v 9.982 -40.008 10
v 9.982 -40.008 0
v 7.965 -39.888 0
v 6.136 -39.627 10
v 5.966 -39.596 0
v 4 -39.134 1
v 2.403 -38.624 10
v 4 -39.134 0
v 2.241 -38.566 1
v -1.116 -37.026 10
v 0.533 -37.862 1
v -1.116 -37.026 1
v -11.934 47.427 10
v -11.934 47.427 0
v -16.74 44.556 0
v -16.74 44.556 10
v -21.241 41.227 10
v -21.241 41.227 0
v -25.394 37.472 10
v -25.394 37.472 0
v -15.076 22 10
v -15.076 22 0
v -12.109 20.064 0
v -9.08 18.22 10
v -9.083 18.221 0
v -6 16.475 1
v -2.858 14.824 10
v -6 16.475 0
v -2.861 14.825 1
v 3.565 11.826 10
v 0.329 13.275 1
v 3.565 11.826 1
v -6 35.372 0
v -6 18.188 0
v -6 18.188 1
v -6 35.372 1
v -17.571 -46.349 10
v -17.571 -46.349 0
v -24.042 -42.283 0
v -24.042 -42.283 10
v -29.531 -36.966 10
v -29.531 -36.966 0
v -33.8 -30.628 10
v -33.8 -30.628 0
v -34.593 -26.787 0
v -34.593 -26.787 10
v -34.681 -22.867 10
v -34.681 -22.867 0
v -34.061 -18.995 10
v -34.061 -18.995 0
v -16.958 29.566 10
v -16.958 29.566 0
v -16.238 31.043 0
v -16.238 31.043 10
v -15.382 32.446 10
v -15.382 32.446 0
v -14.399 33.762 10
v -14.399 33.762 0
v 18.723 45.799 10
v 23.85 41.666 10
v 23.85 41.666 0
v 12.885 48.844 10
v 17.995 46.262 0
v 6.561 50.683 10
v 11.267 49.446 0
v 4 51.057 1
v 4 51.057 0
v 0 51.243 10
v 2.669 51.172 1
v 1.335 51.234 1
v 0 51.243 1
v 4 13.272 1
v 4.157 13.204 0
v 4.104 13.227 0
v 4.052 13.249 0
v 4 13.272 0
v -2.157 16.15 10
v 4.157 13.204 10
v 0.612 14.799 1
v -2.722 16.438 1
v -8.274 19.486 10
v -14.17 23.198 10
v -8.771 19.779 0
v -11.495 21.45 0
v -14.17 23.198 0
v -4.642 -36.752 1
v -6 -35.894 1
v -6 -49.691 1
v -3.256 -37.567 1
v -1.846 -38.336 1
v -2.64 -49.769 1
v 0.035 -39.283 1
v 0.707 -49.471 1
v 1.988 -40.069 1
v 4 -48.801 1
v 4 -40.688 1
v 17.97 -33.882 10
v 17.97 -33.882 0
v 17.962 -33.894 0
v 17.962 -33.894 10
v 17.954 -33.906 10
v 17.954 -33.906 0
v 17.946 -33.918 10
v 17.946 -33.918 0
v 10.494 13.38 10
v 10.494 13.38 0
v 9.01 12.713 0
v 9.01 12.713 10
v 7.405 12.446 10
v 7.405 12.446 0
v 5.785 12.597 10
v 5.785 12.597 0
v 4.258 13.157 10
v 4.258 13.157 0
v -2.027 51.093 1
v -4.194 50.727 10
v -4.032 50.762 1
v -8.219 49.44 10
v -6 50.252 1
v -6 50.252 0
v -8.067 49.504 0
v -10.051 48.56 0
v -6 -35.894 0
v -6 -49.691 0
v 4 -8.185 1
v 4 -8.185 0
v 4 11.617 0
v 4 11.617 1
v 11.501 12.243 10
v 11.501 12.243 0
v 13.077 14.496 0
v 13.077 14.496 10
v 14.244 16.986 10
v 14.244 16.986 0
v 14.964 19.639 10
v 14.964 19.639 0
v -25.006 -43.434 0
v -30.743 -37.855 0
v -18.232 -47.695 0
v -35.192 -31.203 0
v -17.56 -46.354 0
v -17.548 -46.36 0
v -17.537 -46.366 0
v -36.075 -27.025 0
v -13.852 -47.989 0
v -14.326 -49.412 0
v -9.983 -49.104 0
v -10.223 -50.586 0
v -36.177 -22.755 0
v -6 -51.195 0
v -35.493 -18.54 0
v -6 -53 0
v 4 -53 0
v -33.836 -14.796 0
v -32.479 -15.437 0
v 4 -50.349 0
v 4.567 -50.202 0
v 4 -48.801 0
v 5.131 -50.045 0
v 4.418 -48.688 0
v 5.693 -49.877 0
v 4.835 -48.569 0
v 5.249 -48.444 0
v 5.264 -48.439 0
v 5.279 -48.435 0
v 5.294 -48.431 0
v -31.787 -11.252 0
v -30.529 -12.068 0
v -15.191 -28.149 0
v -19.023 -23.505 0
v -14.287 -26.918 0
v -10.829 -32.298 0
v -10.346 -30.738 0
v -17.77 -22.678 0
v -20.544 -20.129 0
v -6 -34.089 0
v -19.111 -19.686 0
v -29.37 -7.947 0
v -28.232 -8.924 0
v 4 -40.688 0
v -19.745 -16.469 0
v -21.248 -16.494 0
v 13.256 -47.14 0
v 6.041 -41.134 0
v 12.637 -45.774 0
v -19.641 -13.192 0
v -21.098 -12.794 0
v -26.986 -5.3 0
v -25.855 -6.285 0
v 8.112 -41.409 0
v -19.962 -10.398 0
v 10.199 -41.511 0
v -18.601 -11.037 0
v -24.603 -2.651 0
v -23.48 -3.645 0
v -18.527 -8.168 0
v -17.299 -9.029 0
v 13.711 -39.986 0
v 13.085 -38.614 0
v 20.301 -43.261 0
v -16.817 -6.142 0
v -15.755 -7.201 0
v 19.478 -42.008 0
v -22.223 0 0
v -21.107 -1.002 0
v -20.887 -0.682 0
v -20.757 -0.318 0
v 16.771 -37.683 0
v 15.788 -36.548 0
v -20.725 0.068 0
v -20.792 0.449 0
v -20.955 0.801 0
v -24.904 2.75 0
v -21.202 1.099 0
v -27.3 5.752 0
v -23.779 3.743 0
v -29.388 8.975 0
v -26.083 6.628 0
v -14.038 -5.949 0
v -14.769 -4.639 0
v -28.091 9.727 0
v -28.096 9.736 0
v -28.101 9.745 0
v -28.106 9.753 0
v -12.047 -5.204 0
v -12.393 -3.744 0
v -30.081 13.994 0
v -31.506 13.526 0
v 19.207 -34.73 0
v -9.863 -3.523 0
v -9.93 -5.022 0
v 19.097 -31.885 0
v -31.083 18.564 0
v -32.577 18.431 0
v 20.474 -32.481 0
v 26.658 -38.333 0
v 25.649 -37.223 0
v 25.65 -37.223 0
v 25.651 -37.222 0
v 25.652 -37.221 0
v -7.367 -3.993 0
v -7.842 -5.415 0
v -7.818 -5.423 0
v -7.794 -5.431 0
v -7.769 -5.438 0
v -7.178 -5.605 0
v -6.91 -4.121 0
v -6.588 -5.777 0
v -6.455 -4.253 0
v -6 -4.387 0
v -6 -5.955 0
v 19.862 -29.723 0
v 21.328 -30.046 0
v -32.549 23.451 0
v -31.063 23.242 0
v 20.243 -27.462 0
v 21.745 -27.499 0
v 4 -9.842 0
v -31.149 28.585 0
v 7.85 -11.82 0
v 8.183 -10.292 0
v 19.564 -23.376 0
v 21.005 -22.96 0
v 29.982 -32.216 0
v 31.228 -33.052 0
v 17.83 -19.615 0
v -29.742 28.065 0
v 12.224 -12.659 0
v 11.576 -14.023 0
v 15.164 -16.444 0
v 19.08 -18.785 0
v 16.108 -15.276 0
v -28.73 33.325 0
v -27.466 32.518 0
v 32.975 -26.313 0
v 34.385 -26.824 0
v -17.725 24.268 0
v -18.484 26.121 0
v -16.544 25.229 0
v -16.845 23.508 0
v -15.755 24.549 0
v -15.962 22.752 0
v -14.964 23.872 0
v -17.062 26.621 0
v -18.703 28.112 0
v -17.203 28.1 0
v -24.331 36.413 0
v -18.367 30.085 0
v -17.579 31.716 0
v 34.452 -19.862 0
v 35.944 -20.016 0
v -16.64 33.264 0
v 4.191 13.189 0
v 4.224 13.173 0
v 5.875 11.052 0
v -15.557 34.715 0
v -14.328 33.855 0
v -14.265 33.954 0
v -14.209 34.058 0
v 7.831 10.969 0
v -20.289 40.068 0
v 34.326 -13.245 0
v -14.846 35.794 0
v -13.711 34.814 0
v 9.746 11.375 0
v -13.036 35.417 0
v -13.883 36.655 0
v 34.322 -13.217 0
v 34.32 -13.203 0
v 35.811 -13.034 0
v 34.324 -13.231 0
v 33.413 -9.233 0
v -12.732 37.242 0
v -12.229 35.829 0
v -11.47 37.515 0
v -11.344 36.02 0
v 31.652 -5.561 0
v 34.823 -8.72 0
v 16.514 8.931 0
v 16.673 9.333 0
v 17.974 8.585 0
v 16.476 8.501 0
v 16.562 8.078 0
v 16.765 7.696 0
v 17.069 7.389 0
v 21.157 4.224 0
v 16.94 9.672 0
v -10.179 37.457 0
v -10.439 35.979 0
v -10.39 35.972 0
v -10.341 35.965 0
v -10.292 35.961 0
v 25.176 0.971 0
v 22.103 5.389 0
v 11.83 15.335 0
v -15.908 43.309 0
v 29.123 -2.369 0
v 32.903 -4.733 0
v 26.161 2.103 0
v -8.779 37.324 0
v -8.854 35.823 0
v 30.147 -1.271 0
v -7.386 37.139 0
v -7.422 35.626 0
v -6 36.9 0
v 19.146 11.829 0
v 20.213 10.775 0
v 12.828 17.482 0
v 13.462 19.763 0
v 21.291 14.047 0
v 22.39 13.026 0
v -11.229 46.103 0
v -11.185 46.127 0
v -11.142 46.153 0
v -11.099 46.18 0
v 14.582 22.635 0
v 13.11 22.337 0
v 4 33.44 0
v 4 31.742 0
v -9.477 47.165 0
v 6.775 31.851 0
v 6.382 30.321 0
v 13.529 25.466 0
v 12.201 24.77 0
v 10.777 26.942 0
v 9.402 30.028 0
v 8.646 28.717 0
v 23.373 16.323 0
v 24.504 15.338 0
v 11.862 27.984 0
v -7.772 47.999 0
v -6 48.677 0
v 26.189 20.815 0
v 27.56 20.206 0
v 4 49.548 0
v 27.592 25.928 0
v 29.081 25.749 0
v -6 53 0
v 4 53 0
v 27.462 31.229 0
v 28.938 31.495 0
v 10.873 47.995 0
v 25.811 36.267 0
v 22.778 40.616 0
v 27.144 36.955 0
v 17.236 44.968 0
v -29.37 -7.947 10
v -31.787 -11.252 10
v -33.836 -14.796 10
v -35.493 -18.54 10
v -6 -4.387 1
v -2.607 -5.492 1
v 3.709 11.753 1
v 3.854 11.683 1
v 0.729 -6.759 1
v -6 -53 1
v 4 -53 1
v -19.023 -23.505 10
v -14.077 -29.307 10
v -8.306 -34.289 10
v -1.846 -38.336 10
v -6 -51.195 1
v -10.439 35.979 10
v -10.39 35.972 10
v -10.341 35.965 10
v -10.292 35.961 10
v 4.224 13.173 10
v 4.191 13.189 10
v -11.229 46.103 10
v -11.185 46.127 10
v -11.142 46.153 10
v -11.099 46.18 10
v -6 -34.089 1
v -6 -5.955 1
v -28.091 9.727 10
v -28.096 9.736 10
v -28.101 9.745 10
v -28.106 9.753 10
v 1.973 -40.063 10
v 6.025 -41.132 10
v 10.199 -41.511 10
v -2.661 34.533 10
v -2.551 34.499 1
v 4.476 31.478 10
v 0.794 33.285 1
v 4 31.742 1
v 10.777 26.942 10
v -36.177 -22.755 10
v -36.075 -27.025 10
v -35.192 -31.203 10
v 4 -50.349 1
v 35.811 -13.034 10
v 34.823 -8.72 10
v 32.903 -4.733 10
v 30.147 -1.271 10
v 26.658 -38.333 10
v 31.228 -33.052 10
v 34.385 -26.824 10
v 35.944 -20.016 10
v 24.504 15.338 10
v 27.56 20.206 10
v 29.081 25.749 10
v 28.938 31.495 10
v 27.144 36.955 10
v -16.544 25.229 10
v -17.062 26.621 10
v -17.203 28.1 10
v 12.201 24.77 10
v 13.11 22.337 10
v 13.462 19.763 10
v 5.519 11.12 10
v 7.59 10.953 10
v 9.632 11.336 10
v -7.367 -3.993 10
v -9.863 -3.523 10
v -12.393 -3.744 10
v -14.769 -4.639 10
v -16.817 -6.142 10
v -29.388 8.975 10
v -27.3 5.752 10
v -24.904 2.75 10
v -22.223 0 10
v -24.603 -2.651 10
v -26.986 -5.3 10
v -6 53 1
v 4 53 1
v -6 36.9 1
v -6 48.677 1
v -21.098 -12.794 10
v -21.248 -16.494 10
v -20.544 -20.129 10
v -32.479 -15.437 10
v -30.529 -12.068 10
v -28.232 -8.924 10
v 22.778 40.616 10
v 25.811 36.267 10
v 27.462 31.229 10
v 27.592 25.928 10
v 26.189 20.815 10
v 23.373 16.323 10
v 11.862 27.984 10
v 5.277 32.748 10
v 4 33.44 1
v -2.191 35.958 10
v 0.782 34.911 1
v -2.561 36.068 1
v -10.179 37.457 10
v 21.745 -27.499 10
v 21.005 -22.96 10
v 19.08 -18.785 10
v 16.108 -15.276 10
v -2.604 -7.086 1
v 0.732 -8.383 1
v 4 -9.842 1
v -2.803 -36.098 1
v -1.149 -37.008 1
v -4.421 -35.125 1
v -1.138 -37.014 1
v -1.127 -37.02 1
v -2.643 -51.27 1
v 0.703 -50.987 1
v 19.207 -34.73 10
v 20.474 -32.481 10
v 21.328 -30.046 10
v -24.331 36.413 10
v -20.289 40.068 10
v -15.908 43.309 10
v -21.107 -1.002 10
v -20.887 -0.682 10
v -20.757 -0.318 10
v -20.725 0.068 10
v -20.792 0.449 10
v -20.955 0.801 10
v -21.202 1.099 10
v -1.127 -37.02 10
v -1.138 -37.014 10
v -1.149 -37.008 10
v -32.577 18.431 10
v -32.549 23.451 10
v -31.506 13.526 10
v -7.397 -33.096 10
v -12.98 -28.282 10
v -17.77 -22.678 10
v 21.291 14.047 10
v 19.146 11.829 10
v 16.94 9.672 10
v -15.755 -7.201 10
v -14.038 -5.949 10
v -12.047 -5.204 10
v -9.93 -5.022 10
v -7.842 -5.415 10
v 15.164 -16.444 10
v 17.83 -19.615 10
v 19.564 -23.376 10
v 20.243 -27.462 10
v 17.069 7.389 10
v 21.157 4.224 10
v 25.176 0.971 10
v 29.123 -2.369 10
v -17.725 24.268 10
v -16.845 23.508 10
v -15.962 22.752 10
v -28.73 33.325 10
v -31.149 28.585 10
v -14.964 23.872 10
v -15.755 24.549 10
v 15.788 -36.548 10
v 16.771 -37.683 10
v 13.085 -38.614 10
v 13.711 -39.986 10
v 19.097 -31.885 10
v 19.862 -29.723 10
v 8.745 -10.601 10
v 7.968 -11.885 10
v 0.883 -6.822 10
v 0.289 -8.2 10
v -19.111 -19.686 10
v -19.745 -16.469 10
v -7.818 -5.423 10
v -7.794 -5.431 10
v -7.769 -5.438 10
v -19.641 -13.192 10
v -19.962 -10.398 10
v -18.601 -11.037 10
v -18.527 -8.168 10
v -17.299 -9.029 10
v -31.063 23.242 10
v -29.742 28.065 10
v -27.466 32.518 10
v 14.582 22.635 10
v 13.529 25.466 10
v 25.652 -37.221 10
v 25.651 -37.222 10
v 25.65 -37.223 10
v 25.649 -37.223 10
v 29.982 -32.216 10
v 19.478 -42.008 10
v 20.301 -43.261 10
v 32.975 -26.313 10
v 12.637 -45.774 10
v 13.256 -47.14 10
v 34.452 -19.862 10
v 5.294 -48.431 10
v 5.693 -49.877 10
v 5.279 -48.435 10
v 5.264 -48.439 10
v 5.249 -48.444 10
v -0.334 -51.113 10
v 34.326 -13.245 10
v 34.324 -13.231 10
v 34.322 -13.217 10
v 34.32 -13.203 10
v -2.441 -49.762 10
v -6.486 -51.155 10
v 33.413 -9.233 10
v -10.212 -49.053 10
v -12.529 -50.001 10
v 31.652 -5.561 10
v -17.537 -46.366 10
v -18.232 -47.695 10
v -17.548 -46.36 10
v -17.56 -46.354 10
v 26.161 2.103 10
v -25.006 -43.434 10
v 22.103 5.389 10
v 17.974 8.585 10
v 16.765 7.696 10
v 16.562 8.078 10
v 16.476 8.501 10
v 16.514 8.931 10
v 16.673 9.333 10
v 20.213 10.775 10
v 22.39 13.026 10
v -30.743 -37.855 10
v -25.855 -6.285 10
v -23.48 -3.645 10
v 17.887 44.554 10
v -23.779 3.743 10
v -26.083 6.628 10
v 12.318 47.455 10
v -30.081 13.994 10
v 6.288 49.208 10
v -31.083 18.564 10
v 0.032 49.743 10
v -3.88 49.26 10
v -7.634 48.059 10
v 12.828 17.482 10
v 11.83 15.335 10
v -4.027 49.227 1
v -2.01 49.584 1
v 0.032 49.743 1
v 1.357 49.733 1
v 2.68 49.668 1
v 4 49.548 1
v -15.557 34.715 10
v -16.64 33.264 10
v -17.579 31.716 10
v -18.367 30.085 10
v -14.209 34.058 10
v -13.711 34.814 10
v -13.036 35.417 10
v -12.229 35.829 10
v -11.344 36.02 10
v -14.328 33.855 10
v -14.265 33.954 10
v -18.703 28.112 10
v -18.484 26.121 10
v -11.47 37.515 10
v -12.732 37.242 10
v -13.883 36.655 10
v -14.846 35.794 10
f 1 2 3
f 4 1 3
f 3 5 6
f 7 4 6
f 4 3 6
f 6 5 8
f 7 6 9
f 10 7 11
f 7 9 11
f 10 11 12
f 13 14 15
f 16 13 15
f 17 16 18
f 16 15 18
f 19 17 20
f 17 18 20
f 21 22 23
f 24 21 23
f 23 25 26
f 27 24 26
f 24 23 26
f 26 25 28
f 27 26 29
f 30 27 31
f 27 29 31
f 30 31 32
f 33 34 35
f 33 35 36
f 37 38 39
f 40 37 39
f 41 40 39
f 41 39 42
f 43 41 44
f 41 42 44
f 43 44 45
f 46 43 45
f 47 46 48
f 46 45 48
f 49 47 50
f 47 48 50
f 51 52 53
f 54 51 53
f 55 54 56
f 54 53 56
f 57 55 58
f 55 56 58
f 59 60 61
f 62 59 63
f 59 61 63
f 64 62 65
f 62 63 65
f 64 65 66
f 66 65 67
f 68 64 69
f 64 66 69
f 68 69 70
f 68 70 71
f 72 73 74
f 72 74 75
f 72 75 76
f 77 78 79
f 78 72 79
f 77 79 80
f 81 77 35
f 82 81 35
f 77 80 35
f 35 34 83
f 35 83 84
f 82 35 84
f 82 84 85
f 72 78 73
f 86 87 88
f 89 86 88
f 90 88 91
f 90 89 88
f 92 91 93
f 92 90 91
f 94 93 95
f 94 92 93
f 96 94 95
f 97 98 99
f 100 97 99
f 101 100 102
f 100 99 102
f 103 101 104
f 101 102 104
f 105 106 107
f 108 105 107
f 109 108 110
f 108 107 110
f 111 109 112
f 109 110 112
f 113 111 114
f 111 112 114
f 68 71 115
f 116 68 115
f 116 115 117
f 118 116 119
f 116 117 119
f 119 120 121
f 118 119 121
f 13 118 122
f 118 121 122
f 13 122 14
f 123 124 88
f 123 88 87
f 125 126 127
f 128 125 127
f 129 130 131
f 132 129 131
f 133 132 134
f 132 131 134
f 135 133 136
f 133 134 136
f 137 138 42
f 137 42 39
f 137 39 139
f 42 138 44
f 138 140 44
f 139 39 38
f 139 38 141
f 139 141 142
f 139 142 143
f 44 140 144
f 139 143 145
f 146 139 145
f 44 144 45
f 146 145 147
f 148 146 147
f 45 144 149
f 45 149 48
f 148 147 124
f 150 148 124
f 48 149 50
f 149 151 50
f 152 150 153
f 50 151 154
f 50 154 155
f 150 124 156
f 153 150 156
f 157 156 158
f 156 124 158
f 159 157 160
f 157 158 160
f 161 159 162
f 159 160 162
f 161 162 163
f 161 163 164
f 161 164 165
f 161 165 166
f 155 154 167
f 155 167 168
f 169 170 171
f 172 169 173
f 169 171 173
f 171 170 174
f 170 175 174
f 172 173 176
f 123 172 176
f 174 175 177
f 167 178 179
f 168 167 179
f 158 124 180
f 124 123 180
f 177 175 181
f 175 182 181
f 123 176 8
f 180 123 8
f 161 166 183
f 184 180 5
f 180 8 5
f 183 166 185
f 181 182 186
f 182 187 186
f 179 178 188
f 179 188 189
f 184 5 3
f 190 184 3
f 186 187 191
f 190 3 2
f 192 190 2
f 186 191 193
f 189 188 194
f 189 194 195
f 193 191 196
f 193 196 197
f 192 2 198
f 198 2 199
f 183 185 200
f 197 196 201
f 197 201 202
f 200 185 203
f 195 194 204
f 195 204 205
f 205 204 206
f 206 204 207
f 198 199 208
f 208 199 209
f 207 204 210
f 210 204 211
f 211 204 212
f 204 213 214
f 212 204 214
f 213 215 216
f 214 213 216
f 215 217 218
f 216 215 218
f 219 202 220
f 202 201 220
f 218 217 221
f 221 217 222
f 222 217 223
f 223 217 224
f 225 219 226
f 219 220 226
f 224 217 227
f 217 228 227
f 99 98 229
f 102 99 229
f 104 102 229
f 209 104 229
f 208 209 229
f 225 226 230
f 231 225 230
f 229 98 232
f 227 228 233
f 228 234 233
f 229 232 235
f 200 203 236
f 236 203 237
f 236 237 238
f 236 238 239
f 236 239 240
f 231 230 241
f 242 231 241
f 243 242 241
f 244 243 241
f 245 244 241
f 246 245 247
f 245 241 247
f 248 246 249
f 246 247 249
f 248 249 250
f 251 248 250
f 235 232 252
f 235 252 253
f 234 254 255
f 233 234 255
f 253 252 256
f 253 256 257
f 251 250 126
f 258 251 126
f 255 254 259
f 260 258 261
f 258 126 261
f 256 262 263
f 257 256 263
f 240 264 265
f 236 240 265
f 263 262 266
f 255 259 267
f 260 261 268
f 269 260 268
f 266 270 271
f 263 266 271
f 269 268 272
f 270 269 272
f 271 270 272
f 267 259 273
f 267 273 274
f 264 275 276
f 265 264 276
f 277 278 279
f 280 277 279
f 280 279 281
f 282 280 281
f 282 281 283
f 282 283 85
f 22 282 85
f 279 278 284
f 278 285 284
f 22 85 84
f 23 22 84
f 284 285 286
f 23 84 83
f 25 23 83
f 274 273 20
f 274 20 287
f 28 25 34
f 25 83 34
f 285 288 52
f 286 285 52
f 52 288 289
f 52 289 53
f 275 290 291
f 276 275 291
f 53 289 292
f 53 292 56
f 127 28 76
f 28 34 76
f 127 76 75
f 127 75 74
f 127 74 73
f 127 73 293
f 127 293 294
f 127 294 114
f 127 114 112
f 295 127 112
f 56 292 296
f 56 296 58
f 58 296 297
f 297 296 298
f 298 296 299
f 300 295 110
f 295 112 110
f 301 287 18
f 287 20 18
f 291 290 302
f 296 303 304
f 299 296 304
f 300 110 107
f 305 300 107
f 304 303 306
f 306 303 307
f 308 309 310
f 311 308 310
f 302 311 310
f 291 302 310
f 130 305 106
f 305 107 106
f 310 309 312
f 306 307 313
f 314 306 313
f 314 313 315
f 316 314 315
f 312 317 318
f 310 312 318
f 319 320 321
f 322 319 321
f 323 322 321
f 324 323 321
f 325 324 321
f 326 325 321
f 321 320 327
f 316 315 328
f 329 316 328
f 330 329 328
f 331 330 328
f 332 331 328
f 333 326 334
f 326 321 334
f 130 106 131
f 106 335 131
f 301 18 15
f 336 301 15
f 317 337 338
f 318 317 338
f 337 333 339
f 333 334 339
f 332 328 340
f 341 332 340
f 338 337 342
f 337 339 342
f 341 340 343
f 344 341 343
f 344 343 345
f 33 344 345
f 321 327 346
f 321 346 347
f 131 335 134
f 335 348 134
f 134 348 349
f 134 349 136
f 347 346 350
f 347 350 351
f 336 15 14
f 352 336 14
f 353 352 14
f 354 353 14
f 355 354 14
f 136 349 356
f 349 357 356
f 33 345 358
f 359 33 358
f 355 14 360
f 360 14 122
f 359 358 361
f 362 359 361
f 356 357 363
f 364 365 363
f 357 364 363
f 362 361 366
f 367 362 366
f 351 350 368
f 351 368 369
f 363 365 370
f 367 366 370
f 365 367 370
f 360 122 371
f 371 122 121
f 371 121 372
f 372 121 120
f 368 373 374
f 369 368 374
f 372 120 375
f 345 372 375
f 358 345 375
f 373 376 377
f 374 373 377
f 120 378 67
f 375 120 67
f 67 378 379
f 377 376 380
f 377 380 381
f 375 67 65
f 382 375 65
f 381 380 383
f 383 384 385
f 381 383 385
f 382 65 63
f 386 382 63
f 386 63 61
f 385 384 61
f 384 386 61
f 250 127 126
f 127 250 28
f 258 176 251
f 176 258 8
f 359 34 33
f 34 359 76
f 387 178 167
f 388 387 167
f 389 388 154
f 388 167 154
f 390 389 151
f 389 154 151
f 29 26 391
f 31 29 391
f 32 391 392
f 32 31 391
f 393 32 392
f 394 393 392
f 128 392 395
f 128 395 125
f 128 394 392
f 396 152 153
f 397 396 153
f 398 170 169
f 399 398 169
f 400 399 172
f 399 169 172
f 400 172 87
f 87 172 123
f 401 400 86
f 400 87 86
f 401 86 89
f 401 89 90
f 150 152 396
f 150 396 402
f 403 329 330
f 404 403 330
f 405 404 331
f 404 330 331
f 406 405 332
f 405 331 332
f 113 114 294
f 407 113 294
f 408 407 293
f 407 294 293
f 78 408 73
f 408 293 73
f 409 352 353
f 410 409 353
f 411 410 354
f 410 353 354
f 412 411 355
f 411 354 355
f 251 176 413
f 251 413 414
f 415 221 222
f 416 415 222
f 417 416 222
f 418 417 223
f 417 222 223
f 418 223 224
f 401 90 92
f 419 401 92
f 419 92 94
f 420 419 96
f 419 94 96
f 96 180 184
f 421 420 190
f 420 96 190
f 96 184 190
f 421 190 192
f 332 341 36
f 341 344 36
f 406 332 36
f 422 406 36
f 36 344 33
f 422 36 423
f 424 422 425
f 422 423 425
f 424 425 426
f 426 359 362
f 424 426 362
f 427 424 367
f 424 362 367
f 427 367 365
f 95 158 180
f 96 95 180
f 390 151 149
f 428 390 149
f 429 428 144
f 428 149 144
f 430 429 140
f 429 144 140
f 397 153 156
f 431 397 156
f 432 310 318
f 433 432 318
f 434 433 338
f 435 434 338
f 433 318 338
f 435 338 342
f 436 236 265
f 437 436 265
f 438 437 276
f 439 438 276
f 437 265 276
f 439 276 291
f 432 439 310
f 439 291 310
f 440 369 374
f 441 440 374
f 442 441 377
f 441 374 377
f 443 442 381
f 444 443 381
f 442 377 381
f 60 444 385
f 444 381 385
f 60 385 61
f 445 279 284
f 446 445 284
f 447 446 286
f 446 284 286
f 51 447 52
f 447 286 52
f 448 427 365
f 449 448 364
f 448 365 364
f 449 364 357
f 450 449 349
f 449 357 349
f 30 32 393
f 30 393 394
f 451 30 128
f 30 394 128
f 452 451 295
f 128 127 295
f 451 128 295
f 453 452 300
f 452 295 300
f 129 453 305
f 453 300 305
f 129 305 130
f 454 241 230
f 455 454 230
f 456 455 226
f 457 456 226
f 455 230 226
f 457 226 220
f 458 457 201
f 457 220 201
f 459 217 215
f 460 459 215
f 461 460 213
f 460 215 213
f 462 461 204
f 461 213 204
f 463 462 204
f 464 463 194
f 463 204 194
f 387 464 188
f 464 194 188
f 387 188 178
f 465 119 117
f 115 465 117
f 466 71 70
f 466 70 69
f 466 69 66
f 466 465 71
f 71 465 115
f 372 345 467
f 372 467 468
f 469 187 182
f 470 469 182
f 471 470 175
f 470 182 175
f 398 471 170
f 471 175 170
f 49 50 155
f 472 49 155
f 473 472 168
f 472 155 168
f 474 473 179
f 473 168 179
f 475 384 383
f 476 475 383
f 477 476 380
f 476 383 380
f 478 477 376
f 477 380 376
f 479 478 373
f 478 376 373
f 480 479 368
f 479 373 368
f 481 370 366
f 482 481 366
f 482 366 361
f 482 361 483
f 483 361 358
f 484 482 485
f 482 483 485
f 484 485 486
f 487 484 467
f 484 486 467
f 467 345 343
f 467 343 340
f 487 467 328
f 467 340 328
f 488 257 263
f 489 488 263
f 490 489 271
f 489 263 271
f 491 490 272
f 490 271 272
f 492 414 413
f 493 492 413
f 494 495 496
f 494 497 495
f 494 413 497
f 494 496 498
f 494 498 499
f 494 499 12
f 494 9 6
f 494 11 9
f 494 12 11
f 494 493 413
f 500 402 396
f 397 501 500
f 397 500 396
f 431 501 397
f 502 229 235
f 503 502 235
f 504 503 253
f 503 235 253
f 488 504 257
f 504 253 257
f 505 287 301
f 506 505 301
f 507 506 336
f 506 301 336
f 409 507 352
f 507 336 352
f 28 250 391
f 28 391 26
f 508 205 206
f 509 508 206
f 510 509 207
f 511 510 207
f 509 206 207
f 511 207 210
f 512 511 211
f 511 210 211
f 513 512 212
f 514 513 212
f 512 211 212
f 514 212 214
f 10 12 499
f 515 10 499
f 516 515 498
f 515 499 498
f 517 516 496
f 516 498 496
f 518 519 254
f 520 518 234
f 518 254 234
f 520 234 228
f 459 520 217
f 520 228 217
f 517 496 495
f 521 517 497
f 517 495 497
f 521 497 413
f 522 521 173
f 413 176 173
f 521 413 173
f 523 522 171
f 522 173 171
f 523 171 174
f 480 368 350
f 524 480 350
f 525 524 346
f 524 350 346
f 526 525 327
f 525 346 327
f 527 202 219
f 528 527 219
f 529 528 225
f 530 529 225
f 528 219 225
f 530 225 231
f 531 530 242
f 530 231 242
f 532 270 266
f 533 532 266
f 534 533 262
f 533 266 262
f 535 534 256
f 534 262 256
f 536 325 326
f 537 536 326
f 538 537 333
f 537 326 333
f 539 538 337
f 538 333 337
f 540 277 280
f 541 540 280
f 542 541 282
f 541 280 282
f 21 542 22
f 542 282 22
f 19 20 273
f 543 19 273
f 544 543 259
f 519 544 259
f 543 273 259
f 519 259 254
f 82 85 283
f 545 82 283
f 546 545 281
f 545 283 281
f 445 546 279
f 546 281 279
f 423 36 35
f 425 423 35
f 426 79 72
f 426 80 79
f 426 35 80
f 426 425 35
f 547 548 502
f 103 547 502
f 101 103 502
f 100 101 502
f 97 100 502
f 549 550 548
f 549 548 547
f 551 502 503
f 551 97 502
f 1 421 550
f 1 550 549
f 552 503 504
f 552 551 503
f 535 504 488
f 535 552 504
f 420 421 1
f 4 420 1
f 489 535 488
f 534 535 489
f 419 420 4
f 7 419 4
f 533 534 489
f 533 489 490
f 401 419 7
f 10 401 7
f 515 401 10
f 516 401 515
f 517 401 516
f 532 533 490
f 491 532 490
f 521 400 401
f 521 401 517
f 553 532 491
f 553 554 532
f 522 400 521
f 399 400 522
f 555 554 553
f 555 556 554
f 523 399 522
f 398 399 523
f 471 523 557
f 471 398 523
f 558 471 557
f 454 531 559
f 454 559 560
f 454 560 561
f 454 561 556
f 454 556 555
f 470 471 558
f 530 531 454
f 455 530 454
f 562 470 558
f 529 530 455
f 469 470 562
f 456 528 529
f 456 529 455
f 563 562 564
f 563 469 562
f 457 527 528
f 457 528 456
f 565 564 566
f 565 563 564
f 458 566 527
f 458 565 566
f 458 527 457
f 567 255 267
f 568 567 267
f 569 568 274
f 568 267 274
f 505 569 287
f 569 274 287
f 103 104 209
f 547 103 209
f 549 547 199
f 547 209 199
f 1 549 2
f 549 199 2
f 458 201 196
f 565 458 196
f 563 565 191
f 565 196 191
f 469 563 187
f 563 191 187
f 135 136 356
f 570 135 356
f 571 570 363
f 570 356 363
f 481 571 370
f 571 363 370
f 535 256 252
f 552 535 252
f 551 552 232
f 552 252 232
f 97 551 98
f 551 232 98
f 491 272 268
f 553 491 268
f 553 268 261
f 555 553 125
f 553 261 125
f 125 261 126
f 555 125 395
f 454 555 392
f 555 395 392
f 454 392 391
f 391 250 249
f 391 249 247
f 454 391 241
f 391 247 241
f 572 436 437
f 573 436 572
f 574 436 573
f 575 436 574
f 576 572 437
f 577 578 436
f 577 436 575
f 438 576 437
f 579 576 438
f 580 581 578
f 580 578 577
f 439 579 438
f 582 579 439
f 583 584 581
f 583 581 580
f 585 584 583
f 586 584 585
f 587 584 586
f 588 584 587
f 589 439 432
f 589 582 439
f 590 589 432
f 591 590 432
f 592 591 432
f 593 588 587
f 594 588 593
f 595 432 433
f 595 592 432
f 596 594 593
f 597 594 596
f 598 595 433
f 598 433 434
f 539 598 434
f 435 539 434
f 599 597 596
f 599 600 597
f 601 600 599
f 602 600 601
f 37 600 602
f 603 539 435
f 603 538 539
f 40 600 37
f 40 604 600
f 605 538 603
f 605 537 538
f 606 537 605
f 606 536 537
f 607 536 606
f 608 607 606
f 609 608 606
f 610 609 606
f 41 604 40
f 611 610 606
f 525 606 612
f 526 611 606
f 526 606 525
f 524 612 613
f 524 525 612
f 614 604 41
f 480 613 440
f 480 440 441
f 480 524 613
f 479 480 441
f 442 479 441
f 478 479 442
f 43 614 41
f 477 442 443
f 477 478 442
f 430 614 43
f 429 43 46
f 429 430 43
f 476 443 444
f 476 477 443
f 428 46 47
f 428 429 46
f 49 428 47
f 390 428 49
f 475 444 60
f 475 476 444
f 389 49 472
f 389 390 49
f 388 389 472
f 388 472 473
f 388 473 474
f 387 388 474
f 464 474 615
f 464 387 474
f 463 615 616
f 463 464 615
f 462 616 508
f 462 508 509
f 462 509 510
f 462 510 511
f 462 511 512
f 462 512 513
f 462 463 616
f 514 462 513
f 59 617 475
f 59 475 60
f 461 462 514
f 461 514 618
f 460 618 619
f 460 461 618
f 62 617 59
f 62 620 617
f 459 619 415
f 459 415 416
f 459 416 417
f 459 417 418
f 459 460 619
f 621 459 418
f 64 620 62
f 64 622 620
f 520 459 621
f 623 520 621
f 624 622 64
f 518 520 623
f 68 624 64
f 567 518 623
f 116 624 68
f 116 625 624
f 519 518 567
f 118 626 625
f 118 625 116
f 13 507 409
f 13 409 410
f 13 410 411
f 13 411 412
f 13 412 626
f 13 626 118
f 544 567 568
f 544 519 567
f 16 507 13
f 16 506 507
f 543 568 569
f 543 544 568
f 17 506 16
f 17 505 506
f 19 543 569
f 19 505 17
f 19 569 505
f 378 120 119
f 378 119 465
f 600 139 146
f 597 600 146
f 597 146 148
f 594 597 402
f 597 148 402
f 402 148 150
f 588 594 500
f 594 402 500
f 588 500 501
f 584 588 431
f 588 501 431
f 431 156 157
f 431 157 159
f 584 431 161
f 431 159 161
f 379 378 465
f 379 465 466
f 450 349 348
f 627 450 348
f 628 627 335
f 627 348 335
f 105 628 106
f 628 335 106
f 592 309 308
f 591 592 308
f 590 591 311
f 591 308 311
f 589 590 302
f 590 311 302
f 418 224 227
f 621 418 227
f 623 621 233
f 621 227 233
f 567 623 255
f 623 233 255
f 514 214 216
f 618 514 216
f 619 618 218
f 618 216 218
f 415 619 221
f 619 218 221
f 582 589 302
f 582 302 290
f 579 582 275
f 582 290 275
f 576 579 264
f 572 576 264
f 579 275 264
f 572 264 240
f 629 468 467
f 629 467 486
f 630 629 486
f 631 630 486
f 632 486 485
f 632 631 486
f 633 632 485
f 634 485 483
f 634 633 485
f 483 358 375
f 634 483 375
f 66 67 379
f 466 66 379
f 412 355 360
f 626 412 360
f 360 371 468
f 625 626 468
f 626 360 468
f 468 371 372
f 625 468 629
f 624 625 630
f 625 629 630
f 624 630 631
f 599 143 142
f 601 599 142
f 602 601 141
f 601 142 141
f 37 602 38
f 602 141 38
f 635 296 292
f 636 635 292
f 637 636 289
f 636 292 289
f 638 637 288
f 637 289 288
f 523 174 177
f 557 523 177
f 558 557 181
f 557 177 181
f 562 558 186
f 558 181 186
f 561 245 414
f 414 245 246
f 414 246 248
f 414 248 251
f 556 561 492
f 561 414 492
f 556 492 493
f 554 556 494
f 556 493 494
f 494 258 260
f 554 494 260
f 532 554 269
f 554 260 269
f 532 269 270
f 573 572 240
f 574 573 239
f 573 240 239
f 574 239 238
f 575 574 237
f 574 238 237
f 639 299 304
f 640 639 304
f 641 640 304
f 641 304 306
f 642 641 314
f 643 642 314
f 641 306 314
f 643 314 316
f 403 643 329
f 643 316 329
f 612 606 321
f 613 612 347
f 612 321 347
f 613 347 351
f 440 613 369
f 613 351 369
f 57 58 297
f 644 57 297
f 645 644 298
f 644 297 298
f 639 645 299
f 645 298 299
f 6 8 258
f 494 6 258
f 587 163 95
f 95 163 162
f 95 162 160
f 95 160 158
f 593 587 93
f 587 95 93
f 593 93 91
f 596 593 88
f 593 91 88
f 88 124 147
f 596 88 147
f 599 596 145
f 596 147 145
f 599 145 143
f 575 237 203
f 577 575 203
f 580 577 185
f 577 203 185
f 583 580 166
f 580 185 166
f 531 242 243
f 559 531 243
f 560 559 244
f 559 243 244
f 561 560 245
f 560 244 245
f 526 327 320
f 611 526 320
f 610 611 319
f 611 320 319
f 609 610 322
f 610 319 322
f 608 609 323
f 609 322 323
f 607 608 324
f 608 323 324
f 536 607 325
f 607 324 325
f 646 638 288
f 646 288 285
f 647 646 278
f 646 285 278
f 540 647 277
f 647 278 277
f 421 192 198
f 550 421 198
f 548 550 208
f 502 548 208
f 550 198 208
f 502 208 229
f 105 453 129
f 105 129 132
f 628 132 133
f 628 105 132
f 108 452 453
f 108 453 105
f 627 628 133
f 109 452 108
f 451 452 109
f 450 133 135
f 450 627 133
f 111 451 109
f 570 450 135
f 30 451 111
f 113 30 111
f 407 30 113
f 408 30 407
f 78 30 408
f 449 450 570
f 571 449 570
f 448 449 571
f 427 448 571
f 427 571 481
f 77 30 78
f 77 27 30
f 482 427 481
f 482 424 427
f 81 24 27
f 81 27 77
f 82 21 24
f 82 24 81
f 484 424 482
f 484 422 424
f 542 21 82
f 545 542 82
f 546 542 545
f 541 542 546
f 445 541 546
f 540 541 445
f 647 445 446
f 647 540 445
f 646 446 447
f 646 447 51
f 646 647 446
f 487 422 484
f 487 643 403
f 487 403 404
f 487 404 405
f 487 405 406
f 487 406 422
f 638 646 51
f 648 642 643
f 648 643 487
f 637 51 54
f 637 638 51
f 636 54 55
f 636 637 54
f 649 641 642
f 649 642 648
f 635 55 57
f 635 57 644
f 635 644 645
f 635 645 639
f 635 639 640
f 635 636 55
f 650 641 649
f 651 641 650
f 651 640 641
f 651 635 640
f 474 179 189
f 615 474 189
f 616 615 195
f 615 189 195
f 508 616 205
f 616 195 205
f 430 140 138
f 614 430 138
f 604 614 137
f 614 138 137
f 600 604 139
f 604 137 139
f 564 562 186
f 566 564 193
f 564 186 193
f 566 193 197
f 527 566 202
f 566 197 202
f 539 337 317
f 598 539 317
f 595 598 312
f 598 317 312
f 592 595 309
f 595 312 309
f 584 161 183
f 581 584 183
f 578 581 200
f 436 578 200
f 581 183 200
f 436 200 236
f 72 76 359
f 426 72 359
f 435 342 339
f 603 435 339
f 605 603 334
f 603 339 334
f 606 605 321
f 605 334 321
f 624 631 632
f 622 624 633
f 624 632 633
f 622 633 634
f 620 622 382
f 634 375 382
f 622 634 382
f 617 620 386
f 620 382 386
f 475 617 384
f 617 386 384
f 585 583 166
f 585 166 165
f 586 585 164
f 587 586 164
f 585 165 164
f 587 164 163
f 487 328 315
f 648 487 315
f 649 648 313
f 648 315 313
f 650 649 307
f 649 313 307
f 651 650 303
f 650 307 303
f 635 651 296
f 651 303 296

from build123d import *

# Parameters (mm, degrees)
BOX_W         = 10
BOX_H         = 106
BOX_DEPTH     = 1
EXTRUDE_DEPTH = 10


with BuildPart() as cube:
    # Box → Box (new body)
    with BuildSketch(Plane(origin=(-6, -53, 0), x_dir=(1, 0, 0), z_dir=(0, 0, 1))):
        with Locations((5, 53)):
            Rectangle(BOX_W, BOX_H)
    extrude(amount=BOX_DEPTH)


with BuildPart() as fusion:
    # Offset2D → Extrude (new body)
    with BuildSketch(Plane(origin=(-0.426228, -0.837563, 0), x_dir=(0, 1, 0), z_dir=(0, 0, 1))):
        with BuildLine():
            ThreePointArc((42.503525, -24.276272), (49.68176, -13.31089), (52.080118, -0.426228))
            ThreePointArc((52.080118, -0.426228), (51.015355, 5.810333), (48.264258, 11.507689))
            ThreePointArc((48.264258, 11.507689), (43.784533, 18.605601), (38.309512, 24.967395))
            ThreePointArc((38.309512, 24.967395), (31.855149, 29.634938), (24.288431, 32.122818))
            ThreePointArc((24.288431, 32.122818), (16.786489, 31.750925), (9.812264, 28.962088))
            ThreePointArc((9.812264, 28.962088), (5.058836, 25.712847), (0.837563, 21.797045))
            ThreePointArc((0.837563, 21.797045), (-3.138279, 25.368097), (-7.109626, 28.944146))
            ThreePointArc((-7.109626, 28.944146), (-12.158639, 32.433141), (-17.702089, 35.066729))
            ThreePointArc((-17.702089, 35.066729), (-24.054754, 35.79826), (-30.365509, 34.765847))
            ThreePointArc((-30.365509, 34.765847), (-39.957434, 27.594753), (-46.857377, 17.805962))
            ThreePointArc((-46.857377, 17.805962), (-50.317164, 6.059483), (-49.039004, -6.11903))
            ThreePointArc((-49.039004, -6.11903), (-44.500868, -17.280695), (-37.495914, -27.084166))
            ThreePointArc((-37.495914, -27.084166), (-25.986015, -34.811524), (-12.196241, -36.236991))
            ThreePointArc((-12.196241, -36.236991), (-5.835332, -34.400867), (-0.433382, -30.573144))
            ThreePointArc((-0.433382, -30.573144), (4.594591, -24.567416), (9.422656, -18.399834))
            ThreePointArc((9.422656, -18.399834), (12.730523, -21.735725), (16.175134, -24.930222))
            ThreePointArc((16.175134, -24.930222), (29.464589, -29.646272), (42.503525, -24.276272))
        make_face()
        with BuildLine():
            ThreePointArc((50.580413, -0.458151), (48.292873, -12.744264), (41.45398, -23.204232))
            ThreePointArc((41.45398, -23.204232), (29.420995, -28.146891), (17.160495, -23.799162))
            ThreePointArc((17.160495, -23.799162), (13.767835, -20.652193), (10.509658, -17.366187))
            ThreePointArc((10.509658, -17.366187), (9.338332, -16.902206), (8.226493, -17.49474))
            ThreePointArc((8.226493, -17.49474), (3.446379, -23.60181), (-1.530981, -29.549219))
            ThreePointArc((-1.530981, -29.549219), (-6.510376, -33.061053), (-12.365823, -34.746608))
            ThreePointArc((-12.365823, -34.746608), (-12.386537, -34.749111), (-12.407214, -34.751901))
            ThreePointArc((-12.407214, -34.751901), (-25.475718, -33.400993), (-36.383595, -26.077812))
            ThreePointArc((-36.383595, -26.077812), (-36.384661, -26.076636), (-36.385727, -26.075461))
            ThreePointArc((-36.385727, -26.075461), (-43.186869, -16.557226), (-47.592966, -5.720316))
            ThreePointArc((-47.592966, -5.720316), (-47.599325, -5.69793), (-47.606032, -5.675645))
            ThreePointArc((-47.606032, -5.675645), (-48.823362, 5.923269), (-45.528232, 17.11071))
            ThreePointArc((-45.528232, 17.11071), (-45.519523, 17.12762), (-45.511029, 17.144638))
            ThreePointArc((-45.511029, 17.144638), (-38.930567, 26.499036), (-29.789964, 33.373381))
            ThreePointArc((-29.789964, 33.373381), (-23.99136, 34.299325), (-18.157006, 33.634866))
            ThreePointArc((-18.157006, 33.634866), (-12.888907, 31.122689), (-8.086797, 27.805513))
            ThreePointArc((-8.086797, 27.805513), (-4.127663, 24.240509), (-0.164064, 20.680469))
            ThreePointArc((-0.164064, 20.680469), (0.905659, 20.298592), (1.936336, 20.77592))
            ThreePointArc((1.936336, 20.77592), (5.994706, 24.540606), (10.564694, 27.664456))
            ThreePointArc((10.564694, 27.664456), (10.577868, 27.672185), (10.590962, 27.680047))
            ThreePointArc((10.590962, 27.680047), (17.089081, 30.281647), (24.079619, 30.636968))
            ThreePointArc((24.079619, 30.636968), (31.187217, 28.29176), (37.251055, 23.904526))
            ThreePointArc((37.251055, 23.904526), (42.579895, 17.711815), (46.940184, 10.802829))
            ThreePointArc((46.940184, 10.802829), (46.977469, 10.736863), (47.018038, 10.672863))
            ThreePointArc((47.018038, 10.672863), (49.584915, 5.358808), (50.580413, -0.458151))
        make_face(mode=Mode.SUBTRACT)
        with BuildLine():
            ThreePointArc((35.552622, 15.131092), (33.338518, 16.701666), (30.923044, 17.940394))
            ThreePointArc((30.923044, 17.940394), (27.946256, 18.236801), (25.105466, 17.299229))
            ThreePointArc((25.105466, 17.299229), (23.967442, 15.978028), (22.837721, 14.649721))
            ThreePointArc((22.837721, 14.649721), (17.31029, 5.569336), (12.663486, -3.991684))
            ThreePointArc((12.663486, -3.991684), (11.790559, -8.016187), (13.080744, -11.926946))
            ThreePointArc((13.080744, -11.926946), (16.552966, -14.14054), (20.476526, -15.390342))
            ThreePointArc((20.476526, -15.390342), (24.918231, -14.563002), (28.821685, -12.287857))
            ThreePointArc((28.821685, -12.287857), (35.396432, -2.057673), (38.294161, 9.752794))
            ThreePointArc((38.294161, 9.752794), (37.823131, 12.900577), (35.552622, 15.131092))
        make_face()
        with BuildLine():
            ThreePointArc((30.40309, 16.531325), (32.591653, 15.400263), (34.599518, 13.972822))
            ThreePointArc((34.599518, 13.972822), (34.741804, 13.86912), (34.895262, 13.782805))
            ThreePointArc((34.895262, 13.782805), (36.486738, 12.219363), (36.816899, 10.012976))
            ThreePointArc((36.816899, 10.012976), (36.80583, 9.939531), (36.798411, 9.865628))
            ThreePointArc((36.798411, 9.865628), (34.038666, -1.417946), (27.779717, -11.203691))
            ThreePointArc((27.779717, -11.203691), (24.416076, -13.149361), (20.601053, -13.887812))
            ThreePointArc((20.601053, -13.887812), (17.225415, -12.799054), (14.217244, -10.919895))
            ThreePointArc((14.217244, -10.919895), (13.283803, -7.831341), (13.99417, -4.683985))
            ThreePointArc((13.99417, -4.683985), (14.019039, -4.633927), (14.042025, -4.582977))
            ThreePointArc((14.042025, -4.582977), (18.607638, 4.815324), (24.035661, 13.743338))
            ThreePointArc((24.035661, 13.743338), (25.047691, 14.93331), (26.066422, 16.11755))
            ThreePointArc((26.066422, 16.11755), (28.193734, 16.754377), (30.40309, 16.531325))
        make_face(mode=Mode.SUBTRACT)
        with BuildLine():
            ThreePointArc((-5.304279, 16.390724), (-8.42234, 18.854547), (-11.956744, 20.671333))
            ThreePointArc((-11.956744, 20.671333), (-17.494369, 20.574952), (-22.66759, 18.596983))
            ThreePointArc((-22.66759, 18.596983), (-31.070315, 10.860543), (-37.498867, 1.41957))
            ThreePointArc((-37.498867, 1.41957), (-39.844627, -4.40289), (-40.673419, -10.625168))
            ThreePointArc((-40.673419, -10.625168), (-38.087415, -15.735136), (-33.892074, -19.633635))
            ThreePointArc((-33.892074, -19.633635), (-30.444372, -21.380497), (-26.661131, -22.171232))
            ThreePointArc((-26.661131, -22.171232), (-19.969831, -20.610018), (-14.438078, -16.534407))
            ThreePointArc((-14.438078, -16.534407), (-7.758227, -5.295928), (-3.155024, 6.94067))
            ThreePointArc((-3.155024, 6.94067), (-2.90689, 11.966537), (-5.304279, 16.390724))
        make_face()
        with BuildLine():
            ThreePointArc((-12.354501, 19.214576), (-9.175054, 17.555033), (-6.363544, 15.328291))
            ThreePointArc((-6.363544, 15.328291), (-4.366665, 11.621196), (-4.577792, 7.415782))
            ThreePointArc((-4.577792, 7.415782), (-4.589381, 7.379554), (-4.600048, 7.343045))
            ThreePointArc((-4.600048, 7.343045), (-9.092234, -4.608778), (-15.606542, -15.590107))
            ThreePointArc((-15.606542, -15.590107), (-20.599769, -19.248702), (-26.624616, -20.669563))
            ThreePointArc((-26.624616, -20.669563), (-29.983258, -19.952576), (-33.044569, -18.396002))
            ThreePointArc((-33.044569, -18.396002), (-33.062278, -18.38406), (-33.080155, -18.372371))
            ThreePointArc((-33.080155, -18.372371), (-36.821301, -14.922254), (-39.17073, -10.407872))
            ThreePointArc((-39.17073, -10.407872), (-38.364838, -4.675009), (-36.188487, 0.689566))
            ThreePointArc((-36.188487, 0.689566), (-36.179503, 0.705932), (-36.170723, 0.722409))
            ThreePointArc((-36.170723, 0.722409), (-29.95755, 9.85407), (-21.840097, 17.343912))
            ThreePointArc((-21.840097, 17.343912), (-17.257745, 19.092821), (-12.354501, 19.214576))
        make_face(mode=Mode.SUBTRACT)
    extrude(amount=EXTRUDE_DEPTH)

    # Fusion: union Cube
    add(cube.part)


solid = fusion.part
